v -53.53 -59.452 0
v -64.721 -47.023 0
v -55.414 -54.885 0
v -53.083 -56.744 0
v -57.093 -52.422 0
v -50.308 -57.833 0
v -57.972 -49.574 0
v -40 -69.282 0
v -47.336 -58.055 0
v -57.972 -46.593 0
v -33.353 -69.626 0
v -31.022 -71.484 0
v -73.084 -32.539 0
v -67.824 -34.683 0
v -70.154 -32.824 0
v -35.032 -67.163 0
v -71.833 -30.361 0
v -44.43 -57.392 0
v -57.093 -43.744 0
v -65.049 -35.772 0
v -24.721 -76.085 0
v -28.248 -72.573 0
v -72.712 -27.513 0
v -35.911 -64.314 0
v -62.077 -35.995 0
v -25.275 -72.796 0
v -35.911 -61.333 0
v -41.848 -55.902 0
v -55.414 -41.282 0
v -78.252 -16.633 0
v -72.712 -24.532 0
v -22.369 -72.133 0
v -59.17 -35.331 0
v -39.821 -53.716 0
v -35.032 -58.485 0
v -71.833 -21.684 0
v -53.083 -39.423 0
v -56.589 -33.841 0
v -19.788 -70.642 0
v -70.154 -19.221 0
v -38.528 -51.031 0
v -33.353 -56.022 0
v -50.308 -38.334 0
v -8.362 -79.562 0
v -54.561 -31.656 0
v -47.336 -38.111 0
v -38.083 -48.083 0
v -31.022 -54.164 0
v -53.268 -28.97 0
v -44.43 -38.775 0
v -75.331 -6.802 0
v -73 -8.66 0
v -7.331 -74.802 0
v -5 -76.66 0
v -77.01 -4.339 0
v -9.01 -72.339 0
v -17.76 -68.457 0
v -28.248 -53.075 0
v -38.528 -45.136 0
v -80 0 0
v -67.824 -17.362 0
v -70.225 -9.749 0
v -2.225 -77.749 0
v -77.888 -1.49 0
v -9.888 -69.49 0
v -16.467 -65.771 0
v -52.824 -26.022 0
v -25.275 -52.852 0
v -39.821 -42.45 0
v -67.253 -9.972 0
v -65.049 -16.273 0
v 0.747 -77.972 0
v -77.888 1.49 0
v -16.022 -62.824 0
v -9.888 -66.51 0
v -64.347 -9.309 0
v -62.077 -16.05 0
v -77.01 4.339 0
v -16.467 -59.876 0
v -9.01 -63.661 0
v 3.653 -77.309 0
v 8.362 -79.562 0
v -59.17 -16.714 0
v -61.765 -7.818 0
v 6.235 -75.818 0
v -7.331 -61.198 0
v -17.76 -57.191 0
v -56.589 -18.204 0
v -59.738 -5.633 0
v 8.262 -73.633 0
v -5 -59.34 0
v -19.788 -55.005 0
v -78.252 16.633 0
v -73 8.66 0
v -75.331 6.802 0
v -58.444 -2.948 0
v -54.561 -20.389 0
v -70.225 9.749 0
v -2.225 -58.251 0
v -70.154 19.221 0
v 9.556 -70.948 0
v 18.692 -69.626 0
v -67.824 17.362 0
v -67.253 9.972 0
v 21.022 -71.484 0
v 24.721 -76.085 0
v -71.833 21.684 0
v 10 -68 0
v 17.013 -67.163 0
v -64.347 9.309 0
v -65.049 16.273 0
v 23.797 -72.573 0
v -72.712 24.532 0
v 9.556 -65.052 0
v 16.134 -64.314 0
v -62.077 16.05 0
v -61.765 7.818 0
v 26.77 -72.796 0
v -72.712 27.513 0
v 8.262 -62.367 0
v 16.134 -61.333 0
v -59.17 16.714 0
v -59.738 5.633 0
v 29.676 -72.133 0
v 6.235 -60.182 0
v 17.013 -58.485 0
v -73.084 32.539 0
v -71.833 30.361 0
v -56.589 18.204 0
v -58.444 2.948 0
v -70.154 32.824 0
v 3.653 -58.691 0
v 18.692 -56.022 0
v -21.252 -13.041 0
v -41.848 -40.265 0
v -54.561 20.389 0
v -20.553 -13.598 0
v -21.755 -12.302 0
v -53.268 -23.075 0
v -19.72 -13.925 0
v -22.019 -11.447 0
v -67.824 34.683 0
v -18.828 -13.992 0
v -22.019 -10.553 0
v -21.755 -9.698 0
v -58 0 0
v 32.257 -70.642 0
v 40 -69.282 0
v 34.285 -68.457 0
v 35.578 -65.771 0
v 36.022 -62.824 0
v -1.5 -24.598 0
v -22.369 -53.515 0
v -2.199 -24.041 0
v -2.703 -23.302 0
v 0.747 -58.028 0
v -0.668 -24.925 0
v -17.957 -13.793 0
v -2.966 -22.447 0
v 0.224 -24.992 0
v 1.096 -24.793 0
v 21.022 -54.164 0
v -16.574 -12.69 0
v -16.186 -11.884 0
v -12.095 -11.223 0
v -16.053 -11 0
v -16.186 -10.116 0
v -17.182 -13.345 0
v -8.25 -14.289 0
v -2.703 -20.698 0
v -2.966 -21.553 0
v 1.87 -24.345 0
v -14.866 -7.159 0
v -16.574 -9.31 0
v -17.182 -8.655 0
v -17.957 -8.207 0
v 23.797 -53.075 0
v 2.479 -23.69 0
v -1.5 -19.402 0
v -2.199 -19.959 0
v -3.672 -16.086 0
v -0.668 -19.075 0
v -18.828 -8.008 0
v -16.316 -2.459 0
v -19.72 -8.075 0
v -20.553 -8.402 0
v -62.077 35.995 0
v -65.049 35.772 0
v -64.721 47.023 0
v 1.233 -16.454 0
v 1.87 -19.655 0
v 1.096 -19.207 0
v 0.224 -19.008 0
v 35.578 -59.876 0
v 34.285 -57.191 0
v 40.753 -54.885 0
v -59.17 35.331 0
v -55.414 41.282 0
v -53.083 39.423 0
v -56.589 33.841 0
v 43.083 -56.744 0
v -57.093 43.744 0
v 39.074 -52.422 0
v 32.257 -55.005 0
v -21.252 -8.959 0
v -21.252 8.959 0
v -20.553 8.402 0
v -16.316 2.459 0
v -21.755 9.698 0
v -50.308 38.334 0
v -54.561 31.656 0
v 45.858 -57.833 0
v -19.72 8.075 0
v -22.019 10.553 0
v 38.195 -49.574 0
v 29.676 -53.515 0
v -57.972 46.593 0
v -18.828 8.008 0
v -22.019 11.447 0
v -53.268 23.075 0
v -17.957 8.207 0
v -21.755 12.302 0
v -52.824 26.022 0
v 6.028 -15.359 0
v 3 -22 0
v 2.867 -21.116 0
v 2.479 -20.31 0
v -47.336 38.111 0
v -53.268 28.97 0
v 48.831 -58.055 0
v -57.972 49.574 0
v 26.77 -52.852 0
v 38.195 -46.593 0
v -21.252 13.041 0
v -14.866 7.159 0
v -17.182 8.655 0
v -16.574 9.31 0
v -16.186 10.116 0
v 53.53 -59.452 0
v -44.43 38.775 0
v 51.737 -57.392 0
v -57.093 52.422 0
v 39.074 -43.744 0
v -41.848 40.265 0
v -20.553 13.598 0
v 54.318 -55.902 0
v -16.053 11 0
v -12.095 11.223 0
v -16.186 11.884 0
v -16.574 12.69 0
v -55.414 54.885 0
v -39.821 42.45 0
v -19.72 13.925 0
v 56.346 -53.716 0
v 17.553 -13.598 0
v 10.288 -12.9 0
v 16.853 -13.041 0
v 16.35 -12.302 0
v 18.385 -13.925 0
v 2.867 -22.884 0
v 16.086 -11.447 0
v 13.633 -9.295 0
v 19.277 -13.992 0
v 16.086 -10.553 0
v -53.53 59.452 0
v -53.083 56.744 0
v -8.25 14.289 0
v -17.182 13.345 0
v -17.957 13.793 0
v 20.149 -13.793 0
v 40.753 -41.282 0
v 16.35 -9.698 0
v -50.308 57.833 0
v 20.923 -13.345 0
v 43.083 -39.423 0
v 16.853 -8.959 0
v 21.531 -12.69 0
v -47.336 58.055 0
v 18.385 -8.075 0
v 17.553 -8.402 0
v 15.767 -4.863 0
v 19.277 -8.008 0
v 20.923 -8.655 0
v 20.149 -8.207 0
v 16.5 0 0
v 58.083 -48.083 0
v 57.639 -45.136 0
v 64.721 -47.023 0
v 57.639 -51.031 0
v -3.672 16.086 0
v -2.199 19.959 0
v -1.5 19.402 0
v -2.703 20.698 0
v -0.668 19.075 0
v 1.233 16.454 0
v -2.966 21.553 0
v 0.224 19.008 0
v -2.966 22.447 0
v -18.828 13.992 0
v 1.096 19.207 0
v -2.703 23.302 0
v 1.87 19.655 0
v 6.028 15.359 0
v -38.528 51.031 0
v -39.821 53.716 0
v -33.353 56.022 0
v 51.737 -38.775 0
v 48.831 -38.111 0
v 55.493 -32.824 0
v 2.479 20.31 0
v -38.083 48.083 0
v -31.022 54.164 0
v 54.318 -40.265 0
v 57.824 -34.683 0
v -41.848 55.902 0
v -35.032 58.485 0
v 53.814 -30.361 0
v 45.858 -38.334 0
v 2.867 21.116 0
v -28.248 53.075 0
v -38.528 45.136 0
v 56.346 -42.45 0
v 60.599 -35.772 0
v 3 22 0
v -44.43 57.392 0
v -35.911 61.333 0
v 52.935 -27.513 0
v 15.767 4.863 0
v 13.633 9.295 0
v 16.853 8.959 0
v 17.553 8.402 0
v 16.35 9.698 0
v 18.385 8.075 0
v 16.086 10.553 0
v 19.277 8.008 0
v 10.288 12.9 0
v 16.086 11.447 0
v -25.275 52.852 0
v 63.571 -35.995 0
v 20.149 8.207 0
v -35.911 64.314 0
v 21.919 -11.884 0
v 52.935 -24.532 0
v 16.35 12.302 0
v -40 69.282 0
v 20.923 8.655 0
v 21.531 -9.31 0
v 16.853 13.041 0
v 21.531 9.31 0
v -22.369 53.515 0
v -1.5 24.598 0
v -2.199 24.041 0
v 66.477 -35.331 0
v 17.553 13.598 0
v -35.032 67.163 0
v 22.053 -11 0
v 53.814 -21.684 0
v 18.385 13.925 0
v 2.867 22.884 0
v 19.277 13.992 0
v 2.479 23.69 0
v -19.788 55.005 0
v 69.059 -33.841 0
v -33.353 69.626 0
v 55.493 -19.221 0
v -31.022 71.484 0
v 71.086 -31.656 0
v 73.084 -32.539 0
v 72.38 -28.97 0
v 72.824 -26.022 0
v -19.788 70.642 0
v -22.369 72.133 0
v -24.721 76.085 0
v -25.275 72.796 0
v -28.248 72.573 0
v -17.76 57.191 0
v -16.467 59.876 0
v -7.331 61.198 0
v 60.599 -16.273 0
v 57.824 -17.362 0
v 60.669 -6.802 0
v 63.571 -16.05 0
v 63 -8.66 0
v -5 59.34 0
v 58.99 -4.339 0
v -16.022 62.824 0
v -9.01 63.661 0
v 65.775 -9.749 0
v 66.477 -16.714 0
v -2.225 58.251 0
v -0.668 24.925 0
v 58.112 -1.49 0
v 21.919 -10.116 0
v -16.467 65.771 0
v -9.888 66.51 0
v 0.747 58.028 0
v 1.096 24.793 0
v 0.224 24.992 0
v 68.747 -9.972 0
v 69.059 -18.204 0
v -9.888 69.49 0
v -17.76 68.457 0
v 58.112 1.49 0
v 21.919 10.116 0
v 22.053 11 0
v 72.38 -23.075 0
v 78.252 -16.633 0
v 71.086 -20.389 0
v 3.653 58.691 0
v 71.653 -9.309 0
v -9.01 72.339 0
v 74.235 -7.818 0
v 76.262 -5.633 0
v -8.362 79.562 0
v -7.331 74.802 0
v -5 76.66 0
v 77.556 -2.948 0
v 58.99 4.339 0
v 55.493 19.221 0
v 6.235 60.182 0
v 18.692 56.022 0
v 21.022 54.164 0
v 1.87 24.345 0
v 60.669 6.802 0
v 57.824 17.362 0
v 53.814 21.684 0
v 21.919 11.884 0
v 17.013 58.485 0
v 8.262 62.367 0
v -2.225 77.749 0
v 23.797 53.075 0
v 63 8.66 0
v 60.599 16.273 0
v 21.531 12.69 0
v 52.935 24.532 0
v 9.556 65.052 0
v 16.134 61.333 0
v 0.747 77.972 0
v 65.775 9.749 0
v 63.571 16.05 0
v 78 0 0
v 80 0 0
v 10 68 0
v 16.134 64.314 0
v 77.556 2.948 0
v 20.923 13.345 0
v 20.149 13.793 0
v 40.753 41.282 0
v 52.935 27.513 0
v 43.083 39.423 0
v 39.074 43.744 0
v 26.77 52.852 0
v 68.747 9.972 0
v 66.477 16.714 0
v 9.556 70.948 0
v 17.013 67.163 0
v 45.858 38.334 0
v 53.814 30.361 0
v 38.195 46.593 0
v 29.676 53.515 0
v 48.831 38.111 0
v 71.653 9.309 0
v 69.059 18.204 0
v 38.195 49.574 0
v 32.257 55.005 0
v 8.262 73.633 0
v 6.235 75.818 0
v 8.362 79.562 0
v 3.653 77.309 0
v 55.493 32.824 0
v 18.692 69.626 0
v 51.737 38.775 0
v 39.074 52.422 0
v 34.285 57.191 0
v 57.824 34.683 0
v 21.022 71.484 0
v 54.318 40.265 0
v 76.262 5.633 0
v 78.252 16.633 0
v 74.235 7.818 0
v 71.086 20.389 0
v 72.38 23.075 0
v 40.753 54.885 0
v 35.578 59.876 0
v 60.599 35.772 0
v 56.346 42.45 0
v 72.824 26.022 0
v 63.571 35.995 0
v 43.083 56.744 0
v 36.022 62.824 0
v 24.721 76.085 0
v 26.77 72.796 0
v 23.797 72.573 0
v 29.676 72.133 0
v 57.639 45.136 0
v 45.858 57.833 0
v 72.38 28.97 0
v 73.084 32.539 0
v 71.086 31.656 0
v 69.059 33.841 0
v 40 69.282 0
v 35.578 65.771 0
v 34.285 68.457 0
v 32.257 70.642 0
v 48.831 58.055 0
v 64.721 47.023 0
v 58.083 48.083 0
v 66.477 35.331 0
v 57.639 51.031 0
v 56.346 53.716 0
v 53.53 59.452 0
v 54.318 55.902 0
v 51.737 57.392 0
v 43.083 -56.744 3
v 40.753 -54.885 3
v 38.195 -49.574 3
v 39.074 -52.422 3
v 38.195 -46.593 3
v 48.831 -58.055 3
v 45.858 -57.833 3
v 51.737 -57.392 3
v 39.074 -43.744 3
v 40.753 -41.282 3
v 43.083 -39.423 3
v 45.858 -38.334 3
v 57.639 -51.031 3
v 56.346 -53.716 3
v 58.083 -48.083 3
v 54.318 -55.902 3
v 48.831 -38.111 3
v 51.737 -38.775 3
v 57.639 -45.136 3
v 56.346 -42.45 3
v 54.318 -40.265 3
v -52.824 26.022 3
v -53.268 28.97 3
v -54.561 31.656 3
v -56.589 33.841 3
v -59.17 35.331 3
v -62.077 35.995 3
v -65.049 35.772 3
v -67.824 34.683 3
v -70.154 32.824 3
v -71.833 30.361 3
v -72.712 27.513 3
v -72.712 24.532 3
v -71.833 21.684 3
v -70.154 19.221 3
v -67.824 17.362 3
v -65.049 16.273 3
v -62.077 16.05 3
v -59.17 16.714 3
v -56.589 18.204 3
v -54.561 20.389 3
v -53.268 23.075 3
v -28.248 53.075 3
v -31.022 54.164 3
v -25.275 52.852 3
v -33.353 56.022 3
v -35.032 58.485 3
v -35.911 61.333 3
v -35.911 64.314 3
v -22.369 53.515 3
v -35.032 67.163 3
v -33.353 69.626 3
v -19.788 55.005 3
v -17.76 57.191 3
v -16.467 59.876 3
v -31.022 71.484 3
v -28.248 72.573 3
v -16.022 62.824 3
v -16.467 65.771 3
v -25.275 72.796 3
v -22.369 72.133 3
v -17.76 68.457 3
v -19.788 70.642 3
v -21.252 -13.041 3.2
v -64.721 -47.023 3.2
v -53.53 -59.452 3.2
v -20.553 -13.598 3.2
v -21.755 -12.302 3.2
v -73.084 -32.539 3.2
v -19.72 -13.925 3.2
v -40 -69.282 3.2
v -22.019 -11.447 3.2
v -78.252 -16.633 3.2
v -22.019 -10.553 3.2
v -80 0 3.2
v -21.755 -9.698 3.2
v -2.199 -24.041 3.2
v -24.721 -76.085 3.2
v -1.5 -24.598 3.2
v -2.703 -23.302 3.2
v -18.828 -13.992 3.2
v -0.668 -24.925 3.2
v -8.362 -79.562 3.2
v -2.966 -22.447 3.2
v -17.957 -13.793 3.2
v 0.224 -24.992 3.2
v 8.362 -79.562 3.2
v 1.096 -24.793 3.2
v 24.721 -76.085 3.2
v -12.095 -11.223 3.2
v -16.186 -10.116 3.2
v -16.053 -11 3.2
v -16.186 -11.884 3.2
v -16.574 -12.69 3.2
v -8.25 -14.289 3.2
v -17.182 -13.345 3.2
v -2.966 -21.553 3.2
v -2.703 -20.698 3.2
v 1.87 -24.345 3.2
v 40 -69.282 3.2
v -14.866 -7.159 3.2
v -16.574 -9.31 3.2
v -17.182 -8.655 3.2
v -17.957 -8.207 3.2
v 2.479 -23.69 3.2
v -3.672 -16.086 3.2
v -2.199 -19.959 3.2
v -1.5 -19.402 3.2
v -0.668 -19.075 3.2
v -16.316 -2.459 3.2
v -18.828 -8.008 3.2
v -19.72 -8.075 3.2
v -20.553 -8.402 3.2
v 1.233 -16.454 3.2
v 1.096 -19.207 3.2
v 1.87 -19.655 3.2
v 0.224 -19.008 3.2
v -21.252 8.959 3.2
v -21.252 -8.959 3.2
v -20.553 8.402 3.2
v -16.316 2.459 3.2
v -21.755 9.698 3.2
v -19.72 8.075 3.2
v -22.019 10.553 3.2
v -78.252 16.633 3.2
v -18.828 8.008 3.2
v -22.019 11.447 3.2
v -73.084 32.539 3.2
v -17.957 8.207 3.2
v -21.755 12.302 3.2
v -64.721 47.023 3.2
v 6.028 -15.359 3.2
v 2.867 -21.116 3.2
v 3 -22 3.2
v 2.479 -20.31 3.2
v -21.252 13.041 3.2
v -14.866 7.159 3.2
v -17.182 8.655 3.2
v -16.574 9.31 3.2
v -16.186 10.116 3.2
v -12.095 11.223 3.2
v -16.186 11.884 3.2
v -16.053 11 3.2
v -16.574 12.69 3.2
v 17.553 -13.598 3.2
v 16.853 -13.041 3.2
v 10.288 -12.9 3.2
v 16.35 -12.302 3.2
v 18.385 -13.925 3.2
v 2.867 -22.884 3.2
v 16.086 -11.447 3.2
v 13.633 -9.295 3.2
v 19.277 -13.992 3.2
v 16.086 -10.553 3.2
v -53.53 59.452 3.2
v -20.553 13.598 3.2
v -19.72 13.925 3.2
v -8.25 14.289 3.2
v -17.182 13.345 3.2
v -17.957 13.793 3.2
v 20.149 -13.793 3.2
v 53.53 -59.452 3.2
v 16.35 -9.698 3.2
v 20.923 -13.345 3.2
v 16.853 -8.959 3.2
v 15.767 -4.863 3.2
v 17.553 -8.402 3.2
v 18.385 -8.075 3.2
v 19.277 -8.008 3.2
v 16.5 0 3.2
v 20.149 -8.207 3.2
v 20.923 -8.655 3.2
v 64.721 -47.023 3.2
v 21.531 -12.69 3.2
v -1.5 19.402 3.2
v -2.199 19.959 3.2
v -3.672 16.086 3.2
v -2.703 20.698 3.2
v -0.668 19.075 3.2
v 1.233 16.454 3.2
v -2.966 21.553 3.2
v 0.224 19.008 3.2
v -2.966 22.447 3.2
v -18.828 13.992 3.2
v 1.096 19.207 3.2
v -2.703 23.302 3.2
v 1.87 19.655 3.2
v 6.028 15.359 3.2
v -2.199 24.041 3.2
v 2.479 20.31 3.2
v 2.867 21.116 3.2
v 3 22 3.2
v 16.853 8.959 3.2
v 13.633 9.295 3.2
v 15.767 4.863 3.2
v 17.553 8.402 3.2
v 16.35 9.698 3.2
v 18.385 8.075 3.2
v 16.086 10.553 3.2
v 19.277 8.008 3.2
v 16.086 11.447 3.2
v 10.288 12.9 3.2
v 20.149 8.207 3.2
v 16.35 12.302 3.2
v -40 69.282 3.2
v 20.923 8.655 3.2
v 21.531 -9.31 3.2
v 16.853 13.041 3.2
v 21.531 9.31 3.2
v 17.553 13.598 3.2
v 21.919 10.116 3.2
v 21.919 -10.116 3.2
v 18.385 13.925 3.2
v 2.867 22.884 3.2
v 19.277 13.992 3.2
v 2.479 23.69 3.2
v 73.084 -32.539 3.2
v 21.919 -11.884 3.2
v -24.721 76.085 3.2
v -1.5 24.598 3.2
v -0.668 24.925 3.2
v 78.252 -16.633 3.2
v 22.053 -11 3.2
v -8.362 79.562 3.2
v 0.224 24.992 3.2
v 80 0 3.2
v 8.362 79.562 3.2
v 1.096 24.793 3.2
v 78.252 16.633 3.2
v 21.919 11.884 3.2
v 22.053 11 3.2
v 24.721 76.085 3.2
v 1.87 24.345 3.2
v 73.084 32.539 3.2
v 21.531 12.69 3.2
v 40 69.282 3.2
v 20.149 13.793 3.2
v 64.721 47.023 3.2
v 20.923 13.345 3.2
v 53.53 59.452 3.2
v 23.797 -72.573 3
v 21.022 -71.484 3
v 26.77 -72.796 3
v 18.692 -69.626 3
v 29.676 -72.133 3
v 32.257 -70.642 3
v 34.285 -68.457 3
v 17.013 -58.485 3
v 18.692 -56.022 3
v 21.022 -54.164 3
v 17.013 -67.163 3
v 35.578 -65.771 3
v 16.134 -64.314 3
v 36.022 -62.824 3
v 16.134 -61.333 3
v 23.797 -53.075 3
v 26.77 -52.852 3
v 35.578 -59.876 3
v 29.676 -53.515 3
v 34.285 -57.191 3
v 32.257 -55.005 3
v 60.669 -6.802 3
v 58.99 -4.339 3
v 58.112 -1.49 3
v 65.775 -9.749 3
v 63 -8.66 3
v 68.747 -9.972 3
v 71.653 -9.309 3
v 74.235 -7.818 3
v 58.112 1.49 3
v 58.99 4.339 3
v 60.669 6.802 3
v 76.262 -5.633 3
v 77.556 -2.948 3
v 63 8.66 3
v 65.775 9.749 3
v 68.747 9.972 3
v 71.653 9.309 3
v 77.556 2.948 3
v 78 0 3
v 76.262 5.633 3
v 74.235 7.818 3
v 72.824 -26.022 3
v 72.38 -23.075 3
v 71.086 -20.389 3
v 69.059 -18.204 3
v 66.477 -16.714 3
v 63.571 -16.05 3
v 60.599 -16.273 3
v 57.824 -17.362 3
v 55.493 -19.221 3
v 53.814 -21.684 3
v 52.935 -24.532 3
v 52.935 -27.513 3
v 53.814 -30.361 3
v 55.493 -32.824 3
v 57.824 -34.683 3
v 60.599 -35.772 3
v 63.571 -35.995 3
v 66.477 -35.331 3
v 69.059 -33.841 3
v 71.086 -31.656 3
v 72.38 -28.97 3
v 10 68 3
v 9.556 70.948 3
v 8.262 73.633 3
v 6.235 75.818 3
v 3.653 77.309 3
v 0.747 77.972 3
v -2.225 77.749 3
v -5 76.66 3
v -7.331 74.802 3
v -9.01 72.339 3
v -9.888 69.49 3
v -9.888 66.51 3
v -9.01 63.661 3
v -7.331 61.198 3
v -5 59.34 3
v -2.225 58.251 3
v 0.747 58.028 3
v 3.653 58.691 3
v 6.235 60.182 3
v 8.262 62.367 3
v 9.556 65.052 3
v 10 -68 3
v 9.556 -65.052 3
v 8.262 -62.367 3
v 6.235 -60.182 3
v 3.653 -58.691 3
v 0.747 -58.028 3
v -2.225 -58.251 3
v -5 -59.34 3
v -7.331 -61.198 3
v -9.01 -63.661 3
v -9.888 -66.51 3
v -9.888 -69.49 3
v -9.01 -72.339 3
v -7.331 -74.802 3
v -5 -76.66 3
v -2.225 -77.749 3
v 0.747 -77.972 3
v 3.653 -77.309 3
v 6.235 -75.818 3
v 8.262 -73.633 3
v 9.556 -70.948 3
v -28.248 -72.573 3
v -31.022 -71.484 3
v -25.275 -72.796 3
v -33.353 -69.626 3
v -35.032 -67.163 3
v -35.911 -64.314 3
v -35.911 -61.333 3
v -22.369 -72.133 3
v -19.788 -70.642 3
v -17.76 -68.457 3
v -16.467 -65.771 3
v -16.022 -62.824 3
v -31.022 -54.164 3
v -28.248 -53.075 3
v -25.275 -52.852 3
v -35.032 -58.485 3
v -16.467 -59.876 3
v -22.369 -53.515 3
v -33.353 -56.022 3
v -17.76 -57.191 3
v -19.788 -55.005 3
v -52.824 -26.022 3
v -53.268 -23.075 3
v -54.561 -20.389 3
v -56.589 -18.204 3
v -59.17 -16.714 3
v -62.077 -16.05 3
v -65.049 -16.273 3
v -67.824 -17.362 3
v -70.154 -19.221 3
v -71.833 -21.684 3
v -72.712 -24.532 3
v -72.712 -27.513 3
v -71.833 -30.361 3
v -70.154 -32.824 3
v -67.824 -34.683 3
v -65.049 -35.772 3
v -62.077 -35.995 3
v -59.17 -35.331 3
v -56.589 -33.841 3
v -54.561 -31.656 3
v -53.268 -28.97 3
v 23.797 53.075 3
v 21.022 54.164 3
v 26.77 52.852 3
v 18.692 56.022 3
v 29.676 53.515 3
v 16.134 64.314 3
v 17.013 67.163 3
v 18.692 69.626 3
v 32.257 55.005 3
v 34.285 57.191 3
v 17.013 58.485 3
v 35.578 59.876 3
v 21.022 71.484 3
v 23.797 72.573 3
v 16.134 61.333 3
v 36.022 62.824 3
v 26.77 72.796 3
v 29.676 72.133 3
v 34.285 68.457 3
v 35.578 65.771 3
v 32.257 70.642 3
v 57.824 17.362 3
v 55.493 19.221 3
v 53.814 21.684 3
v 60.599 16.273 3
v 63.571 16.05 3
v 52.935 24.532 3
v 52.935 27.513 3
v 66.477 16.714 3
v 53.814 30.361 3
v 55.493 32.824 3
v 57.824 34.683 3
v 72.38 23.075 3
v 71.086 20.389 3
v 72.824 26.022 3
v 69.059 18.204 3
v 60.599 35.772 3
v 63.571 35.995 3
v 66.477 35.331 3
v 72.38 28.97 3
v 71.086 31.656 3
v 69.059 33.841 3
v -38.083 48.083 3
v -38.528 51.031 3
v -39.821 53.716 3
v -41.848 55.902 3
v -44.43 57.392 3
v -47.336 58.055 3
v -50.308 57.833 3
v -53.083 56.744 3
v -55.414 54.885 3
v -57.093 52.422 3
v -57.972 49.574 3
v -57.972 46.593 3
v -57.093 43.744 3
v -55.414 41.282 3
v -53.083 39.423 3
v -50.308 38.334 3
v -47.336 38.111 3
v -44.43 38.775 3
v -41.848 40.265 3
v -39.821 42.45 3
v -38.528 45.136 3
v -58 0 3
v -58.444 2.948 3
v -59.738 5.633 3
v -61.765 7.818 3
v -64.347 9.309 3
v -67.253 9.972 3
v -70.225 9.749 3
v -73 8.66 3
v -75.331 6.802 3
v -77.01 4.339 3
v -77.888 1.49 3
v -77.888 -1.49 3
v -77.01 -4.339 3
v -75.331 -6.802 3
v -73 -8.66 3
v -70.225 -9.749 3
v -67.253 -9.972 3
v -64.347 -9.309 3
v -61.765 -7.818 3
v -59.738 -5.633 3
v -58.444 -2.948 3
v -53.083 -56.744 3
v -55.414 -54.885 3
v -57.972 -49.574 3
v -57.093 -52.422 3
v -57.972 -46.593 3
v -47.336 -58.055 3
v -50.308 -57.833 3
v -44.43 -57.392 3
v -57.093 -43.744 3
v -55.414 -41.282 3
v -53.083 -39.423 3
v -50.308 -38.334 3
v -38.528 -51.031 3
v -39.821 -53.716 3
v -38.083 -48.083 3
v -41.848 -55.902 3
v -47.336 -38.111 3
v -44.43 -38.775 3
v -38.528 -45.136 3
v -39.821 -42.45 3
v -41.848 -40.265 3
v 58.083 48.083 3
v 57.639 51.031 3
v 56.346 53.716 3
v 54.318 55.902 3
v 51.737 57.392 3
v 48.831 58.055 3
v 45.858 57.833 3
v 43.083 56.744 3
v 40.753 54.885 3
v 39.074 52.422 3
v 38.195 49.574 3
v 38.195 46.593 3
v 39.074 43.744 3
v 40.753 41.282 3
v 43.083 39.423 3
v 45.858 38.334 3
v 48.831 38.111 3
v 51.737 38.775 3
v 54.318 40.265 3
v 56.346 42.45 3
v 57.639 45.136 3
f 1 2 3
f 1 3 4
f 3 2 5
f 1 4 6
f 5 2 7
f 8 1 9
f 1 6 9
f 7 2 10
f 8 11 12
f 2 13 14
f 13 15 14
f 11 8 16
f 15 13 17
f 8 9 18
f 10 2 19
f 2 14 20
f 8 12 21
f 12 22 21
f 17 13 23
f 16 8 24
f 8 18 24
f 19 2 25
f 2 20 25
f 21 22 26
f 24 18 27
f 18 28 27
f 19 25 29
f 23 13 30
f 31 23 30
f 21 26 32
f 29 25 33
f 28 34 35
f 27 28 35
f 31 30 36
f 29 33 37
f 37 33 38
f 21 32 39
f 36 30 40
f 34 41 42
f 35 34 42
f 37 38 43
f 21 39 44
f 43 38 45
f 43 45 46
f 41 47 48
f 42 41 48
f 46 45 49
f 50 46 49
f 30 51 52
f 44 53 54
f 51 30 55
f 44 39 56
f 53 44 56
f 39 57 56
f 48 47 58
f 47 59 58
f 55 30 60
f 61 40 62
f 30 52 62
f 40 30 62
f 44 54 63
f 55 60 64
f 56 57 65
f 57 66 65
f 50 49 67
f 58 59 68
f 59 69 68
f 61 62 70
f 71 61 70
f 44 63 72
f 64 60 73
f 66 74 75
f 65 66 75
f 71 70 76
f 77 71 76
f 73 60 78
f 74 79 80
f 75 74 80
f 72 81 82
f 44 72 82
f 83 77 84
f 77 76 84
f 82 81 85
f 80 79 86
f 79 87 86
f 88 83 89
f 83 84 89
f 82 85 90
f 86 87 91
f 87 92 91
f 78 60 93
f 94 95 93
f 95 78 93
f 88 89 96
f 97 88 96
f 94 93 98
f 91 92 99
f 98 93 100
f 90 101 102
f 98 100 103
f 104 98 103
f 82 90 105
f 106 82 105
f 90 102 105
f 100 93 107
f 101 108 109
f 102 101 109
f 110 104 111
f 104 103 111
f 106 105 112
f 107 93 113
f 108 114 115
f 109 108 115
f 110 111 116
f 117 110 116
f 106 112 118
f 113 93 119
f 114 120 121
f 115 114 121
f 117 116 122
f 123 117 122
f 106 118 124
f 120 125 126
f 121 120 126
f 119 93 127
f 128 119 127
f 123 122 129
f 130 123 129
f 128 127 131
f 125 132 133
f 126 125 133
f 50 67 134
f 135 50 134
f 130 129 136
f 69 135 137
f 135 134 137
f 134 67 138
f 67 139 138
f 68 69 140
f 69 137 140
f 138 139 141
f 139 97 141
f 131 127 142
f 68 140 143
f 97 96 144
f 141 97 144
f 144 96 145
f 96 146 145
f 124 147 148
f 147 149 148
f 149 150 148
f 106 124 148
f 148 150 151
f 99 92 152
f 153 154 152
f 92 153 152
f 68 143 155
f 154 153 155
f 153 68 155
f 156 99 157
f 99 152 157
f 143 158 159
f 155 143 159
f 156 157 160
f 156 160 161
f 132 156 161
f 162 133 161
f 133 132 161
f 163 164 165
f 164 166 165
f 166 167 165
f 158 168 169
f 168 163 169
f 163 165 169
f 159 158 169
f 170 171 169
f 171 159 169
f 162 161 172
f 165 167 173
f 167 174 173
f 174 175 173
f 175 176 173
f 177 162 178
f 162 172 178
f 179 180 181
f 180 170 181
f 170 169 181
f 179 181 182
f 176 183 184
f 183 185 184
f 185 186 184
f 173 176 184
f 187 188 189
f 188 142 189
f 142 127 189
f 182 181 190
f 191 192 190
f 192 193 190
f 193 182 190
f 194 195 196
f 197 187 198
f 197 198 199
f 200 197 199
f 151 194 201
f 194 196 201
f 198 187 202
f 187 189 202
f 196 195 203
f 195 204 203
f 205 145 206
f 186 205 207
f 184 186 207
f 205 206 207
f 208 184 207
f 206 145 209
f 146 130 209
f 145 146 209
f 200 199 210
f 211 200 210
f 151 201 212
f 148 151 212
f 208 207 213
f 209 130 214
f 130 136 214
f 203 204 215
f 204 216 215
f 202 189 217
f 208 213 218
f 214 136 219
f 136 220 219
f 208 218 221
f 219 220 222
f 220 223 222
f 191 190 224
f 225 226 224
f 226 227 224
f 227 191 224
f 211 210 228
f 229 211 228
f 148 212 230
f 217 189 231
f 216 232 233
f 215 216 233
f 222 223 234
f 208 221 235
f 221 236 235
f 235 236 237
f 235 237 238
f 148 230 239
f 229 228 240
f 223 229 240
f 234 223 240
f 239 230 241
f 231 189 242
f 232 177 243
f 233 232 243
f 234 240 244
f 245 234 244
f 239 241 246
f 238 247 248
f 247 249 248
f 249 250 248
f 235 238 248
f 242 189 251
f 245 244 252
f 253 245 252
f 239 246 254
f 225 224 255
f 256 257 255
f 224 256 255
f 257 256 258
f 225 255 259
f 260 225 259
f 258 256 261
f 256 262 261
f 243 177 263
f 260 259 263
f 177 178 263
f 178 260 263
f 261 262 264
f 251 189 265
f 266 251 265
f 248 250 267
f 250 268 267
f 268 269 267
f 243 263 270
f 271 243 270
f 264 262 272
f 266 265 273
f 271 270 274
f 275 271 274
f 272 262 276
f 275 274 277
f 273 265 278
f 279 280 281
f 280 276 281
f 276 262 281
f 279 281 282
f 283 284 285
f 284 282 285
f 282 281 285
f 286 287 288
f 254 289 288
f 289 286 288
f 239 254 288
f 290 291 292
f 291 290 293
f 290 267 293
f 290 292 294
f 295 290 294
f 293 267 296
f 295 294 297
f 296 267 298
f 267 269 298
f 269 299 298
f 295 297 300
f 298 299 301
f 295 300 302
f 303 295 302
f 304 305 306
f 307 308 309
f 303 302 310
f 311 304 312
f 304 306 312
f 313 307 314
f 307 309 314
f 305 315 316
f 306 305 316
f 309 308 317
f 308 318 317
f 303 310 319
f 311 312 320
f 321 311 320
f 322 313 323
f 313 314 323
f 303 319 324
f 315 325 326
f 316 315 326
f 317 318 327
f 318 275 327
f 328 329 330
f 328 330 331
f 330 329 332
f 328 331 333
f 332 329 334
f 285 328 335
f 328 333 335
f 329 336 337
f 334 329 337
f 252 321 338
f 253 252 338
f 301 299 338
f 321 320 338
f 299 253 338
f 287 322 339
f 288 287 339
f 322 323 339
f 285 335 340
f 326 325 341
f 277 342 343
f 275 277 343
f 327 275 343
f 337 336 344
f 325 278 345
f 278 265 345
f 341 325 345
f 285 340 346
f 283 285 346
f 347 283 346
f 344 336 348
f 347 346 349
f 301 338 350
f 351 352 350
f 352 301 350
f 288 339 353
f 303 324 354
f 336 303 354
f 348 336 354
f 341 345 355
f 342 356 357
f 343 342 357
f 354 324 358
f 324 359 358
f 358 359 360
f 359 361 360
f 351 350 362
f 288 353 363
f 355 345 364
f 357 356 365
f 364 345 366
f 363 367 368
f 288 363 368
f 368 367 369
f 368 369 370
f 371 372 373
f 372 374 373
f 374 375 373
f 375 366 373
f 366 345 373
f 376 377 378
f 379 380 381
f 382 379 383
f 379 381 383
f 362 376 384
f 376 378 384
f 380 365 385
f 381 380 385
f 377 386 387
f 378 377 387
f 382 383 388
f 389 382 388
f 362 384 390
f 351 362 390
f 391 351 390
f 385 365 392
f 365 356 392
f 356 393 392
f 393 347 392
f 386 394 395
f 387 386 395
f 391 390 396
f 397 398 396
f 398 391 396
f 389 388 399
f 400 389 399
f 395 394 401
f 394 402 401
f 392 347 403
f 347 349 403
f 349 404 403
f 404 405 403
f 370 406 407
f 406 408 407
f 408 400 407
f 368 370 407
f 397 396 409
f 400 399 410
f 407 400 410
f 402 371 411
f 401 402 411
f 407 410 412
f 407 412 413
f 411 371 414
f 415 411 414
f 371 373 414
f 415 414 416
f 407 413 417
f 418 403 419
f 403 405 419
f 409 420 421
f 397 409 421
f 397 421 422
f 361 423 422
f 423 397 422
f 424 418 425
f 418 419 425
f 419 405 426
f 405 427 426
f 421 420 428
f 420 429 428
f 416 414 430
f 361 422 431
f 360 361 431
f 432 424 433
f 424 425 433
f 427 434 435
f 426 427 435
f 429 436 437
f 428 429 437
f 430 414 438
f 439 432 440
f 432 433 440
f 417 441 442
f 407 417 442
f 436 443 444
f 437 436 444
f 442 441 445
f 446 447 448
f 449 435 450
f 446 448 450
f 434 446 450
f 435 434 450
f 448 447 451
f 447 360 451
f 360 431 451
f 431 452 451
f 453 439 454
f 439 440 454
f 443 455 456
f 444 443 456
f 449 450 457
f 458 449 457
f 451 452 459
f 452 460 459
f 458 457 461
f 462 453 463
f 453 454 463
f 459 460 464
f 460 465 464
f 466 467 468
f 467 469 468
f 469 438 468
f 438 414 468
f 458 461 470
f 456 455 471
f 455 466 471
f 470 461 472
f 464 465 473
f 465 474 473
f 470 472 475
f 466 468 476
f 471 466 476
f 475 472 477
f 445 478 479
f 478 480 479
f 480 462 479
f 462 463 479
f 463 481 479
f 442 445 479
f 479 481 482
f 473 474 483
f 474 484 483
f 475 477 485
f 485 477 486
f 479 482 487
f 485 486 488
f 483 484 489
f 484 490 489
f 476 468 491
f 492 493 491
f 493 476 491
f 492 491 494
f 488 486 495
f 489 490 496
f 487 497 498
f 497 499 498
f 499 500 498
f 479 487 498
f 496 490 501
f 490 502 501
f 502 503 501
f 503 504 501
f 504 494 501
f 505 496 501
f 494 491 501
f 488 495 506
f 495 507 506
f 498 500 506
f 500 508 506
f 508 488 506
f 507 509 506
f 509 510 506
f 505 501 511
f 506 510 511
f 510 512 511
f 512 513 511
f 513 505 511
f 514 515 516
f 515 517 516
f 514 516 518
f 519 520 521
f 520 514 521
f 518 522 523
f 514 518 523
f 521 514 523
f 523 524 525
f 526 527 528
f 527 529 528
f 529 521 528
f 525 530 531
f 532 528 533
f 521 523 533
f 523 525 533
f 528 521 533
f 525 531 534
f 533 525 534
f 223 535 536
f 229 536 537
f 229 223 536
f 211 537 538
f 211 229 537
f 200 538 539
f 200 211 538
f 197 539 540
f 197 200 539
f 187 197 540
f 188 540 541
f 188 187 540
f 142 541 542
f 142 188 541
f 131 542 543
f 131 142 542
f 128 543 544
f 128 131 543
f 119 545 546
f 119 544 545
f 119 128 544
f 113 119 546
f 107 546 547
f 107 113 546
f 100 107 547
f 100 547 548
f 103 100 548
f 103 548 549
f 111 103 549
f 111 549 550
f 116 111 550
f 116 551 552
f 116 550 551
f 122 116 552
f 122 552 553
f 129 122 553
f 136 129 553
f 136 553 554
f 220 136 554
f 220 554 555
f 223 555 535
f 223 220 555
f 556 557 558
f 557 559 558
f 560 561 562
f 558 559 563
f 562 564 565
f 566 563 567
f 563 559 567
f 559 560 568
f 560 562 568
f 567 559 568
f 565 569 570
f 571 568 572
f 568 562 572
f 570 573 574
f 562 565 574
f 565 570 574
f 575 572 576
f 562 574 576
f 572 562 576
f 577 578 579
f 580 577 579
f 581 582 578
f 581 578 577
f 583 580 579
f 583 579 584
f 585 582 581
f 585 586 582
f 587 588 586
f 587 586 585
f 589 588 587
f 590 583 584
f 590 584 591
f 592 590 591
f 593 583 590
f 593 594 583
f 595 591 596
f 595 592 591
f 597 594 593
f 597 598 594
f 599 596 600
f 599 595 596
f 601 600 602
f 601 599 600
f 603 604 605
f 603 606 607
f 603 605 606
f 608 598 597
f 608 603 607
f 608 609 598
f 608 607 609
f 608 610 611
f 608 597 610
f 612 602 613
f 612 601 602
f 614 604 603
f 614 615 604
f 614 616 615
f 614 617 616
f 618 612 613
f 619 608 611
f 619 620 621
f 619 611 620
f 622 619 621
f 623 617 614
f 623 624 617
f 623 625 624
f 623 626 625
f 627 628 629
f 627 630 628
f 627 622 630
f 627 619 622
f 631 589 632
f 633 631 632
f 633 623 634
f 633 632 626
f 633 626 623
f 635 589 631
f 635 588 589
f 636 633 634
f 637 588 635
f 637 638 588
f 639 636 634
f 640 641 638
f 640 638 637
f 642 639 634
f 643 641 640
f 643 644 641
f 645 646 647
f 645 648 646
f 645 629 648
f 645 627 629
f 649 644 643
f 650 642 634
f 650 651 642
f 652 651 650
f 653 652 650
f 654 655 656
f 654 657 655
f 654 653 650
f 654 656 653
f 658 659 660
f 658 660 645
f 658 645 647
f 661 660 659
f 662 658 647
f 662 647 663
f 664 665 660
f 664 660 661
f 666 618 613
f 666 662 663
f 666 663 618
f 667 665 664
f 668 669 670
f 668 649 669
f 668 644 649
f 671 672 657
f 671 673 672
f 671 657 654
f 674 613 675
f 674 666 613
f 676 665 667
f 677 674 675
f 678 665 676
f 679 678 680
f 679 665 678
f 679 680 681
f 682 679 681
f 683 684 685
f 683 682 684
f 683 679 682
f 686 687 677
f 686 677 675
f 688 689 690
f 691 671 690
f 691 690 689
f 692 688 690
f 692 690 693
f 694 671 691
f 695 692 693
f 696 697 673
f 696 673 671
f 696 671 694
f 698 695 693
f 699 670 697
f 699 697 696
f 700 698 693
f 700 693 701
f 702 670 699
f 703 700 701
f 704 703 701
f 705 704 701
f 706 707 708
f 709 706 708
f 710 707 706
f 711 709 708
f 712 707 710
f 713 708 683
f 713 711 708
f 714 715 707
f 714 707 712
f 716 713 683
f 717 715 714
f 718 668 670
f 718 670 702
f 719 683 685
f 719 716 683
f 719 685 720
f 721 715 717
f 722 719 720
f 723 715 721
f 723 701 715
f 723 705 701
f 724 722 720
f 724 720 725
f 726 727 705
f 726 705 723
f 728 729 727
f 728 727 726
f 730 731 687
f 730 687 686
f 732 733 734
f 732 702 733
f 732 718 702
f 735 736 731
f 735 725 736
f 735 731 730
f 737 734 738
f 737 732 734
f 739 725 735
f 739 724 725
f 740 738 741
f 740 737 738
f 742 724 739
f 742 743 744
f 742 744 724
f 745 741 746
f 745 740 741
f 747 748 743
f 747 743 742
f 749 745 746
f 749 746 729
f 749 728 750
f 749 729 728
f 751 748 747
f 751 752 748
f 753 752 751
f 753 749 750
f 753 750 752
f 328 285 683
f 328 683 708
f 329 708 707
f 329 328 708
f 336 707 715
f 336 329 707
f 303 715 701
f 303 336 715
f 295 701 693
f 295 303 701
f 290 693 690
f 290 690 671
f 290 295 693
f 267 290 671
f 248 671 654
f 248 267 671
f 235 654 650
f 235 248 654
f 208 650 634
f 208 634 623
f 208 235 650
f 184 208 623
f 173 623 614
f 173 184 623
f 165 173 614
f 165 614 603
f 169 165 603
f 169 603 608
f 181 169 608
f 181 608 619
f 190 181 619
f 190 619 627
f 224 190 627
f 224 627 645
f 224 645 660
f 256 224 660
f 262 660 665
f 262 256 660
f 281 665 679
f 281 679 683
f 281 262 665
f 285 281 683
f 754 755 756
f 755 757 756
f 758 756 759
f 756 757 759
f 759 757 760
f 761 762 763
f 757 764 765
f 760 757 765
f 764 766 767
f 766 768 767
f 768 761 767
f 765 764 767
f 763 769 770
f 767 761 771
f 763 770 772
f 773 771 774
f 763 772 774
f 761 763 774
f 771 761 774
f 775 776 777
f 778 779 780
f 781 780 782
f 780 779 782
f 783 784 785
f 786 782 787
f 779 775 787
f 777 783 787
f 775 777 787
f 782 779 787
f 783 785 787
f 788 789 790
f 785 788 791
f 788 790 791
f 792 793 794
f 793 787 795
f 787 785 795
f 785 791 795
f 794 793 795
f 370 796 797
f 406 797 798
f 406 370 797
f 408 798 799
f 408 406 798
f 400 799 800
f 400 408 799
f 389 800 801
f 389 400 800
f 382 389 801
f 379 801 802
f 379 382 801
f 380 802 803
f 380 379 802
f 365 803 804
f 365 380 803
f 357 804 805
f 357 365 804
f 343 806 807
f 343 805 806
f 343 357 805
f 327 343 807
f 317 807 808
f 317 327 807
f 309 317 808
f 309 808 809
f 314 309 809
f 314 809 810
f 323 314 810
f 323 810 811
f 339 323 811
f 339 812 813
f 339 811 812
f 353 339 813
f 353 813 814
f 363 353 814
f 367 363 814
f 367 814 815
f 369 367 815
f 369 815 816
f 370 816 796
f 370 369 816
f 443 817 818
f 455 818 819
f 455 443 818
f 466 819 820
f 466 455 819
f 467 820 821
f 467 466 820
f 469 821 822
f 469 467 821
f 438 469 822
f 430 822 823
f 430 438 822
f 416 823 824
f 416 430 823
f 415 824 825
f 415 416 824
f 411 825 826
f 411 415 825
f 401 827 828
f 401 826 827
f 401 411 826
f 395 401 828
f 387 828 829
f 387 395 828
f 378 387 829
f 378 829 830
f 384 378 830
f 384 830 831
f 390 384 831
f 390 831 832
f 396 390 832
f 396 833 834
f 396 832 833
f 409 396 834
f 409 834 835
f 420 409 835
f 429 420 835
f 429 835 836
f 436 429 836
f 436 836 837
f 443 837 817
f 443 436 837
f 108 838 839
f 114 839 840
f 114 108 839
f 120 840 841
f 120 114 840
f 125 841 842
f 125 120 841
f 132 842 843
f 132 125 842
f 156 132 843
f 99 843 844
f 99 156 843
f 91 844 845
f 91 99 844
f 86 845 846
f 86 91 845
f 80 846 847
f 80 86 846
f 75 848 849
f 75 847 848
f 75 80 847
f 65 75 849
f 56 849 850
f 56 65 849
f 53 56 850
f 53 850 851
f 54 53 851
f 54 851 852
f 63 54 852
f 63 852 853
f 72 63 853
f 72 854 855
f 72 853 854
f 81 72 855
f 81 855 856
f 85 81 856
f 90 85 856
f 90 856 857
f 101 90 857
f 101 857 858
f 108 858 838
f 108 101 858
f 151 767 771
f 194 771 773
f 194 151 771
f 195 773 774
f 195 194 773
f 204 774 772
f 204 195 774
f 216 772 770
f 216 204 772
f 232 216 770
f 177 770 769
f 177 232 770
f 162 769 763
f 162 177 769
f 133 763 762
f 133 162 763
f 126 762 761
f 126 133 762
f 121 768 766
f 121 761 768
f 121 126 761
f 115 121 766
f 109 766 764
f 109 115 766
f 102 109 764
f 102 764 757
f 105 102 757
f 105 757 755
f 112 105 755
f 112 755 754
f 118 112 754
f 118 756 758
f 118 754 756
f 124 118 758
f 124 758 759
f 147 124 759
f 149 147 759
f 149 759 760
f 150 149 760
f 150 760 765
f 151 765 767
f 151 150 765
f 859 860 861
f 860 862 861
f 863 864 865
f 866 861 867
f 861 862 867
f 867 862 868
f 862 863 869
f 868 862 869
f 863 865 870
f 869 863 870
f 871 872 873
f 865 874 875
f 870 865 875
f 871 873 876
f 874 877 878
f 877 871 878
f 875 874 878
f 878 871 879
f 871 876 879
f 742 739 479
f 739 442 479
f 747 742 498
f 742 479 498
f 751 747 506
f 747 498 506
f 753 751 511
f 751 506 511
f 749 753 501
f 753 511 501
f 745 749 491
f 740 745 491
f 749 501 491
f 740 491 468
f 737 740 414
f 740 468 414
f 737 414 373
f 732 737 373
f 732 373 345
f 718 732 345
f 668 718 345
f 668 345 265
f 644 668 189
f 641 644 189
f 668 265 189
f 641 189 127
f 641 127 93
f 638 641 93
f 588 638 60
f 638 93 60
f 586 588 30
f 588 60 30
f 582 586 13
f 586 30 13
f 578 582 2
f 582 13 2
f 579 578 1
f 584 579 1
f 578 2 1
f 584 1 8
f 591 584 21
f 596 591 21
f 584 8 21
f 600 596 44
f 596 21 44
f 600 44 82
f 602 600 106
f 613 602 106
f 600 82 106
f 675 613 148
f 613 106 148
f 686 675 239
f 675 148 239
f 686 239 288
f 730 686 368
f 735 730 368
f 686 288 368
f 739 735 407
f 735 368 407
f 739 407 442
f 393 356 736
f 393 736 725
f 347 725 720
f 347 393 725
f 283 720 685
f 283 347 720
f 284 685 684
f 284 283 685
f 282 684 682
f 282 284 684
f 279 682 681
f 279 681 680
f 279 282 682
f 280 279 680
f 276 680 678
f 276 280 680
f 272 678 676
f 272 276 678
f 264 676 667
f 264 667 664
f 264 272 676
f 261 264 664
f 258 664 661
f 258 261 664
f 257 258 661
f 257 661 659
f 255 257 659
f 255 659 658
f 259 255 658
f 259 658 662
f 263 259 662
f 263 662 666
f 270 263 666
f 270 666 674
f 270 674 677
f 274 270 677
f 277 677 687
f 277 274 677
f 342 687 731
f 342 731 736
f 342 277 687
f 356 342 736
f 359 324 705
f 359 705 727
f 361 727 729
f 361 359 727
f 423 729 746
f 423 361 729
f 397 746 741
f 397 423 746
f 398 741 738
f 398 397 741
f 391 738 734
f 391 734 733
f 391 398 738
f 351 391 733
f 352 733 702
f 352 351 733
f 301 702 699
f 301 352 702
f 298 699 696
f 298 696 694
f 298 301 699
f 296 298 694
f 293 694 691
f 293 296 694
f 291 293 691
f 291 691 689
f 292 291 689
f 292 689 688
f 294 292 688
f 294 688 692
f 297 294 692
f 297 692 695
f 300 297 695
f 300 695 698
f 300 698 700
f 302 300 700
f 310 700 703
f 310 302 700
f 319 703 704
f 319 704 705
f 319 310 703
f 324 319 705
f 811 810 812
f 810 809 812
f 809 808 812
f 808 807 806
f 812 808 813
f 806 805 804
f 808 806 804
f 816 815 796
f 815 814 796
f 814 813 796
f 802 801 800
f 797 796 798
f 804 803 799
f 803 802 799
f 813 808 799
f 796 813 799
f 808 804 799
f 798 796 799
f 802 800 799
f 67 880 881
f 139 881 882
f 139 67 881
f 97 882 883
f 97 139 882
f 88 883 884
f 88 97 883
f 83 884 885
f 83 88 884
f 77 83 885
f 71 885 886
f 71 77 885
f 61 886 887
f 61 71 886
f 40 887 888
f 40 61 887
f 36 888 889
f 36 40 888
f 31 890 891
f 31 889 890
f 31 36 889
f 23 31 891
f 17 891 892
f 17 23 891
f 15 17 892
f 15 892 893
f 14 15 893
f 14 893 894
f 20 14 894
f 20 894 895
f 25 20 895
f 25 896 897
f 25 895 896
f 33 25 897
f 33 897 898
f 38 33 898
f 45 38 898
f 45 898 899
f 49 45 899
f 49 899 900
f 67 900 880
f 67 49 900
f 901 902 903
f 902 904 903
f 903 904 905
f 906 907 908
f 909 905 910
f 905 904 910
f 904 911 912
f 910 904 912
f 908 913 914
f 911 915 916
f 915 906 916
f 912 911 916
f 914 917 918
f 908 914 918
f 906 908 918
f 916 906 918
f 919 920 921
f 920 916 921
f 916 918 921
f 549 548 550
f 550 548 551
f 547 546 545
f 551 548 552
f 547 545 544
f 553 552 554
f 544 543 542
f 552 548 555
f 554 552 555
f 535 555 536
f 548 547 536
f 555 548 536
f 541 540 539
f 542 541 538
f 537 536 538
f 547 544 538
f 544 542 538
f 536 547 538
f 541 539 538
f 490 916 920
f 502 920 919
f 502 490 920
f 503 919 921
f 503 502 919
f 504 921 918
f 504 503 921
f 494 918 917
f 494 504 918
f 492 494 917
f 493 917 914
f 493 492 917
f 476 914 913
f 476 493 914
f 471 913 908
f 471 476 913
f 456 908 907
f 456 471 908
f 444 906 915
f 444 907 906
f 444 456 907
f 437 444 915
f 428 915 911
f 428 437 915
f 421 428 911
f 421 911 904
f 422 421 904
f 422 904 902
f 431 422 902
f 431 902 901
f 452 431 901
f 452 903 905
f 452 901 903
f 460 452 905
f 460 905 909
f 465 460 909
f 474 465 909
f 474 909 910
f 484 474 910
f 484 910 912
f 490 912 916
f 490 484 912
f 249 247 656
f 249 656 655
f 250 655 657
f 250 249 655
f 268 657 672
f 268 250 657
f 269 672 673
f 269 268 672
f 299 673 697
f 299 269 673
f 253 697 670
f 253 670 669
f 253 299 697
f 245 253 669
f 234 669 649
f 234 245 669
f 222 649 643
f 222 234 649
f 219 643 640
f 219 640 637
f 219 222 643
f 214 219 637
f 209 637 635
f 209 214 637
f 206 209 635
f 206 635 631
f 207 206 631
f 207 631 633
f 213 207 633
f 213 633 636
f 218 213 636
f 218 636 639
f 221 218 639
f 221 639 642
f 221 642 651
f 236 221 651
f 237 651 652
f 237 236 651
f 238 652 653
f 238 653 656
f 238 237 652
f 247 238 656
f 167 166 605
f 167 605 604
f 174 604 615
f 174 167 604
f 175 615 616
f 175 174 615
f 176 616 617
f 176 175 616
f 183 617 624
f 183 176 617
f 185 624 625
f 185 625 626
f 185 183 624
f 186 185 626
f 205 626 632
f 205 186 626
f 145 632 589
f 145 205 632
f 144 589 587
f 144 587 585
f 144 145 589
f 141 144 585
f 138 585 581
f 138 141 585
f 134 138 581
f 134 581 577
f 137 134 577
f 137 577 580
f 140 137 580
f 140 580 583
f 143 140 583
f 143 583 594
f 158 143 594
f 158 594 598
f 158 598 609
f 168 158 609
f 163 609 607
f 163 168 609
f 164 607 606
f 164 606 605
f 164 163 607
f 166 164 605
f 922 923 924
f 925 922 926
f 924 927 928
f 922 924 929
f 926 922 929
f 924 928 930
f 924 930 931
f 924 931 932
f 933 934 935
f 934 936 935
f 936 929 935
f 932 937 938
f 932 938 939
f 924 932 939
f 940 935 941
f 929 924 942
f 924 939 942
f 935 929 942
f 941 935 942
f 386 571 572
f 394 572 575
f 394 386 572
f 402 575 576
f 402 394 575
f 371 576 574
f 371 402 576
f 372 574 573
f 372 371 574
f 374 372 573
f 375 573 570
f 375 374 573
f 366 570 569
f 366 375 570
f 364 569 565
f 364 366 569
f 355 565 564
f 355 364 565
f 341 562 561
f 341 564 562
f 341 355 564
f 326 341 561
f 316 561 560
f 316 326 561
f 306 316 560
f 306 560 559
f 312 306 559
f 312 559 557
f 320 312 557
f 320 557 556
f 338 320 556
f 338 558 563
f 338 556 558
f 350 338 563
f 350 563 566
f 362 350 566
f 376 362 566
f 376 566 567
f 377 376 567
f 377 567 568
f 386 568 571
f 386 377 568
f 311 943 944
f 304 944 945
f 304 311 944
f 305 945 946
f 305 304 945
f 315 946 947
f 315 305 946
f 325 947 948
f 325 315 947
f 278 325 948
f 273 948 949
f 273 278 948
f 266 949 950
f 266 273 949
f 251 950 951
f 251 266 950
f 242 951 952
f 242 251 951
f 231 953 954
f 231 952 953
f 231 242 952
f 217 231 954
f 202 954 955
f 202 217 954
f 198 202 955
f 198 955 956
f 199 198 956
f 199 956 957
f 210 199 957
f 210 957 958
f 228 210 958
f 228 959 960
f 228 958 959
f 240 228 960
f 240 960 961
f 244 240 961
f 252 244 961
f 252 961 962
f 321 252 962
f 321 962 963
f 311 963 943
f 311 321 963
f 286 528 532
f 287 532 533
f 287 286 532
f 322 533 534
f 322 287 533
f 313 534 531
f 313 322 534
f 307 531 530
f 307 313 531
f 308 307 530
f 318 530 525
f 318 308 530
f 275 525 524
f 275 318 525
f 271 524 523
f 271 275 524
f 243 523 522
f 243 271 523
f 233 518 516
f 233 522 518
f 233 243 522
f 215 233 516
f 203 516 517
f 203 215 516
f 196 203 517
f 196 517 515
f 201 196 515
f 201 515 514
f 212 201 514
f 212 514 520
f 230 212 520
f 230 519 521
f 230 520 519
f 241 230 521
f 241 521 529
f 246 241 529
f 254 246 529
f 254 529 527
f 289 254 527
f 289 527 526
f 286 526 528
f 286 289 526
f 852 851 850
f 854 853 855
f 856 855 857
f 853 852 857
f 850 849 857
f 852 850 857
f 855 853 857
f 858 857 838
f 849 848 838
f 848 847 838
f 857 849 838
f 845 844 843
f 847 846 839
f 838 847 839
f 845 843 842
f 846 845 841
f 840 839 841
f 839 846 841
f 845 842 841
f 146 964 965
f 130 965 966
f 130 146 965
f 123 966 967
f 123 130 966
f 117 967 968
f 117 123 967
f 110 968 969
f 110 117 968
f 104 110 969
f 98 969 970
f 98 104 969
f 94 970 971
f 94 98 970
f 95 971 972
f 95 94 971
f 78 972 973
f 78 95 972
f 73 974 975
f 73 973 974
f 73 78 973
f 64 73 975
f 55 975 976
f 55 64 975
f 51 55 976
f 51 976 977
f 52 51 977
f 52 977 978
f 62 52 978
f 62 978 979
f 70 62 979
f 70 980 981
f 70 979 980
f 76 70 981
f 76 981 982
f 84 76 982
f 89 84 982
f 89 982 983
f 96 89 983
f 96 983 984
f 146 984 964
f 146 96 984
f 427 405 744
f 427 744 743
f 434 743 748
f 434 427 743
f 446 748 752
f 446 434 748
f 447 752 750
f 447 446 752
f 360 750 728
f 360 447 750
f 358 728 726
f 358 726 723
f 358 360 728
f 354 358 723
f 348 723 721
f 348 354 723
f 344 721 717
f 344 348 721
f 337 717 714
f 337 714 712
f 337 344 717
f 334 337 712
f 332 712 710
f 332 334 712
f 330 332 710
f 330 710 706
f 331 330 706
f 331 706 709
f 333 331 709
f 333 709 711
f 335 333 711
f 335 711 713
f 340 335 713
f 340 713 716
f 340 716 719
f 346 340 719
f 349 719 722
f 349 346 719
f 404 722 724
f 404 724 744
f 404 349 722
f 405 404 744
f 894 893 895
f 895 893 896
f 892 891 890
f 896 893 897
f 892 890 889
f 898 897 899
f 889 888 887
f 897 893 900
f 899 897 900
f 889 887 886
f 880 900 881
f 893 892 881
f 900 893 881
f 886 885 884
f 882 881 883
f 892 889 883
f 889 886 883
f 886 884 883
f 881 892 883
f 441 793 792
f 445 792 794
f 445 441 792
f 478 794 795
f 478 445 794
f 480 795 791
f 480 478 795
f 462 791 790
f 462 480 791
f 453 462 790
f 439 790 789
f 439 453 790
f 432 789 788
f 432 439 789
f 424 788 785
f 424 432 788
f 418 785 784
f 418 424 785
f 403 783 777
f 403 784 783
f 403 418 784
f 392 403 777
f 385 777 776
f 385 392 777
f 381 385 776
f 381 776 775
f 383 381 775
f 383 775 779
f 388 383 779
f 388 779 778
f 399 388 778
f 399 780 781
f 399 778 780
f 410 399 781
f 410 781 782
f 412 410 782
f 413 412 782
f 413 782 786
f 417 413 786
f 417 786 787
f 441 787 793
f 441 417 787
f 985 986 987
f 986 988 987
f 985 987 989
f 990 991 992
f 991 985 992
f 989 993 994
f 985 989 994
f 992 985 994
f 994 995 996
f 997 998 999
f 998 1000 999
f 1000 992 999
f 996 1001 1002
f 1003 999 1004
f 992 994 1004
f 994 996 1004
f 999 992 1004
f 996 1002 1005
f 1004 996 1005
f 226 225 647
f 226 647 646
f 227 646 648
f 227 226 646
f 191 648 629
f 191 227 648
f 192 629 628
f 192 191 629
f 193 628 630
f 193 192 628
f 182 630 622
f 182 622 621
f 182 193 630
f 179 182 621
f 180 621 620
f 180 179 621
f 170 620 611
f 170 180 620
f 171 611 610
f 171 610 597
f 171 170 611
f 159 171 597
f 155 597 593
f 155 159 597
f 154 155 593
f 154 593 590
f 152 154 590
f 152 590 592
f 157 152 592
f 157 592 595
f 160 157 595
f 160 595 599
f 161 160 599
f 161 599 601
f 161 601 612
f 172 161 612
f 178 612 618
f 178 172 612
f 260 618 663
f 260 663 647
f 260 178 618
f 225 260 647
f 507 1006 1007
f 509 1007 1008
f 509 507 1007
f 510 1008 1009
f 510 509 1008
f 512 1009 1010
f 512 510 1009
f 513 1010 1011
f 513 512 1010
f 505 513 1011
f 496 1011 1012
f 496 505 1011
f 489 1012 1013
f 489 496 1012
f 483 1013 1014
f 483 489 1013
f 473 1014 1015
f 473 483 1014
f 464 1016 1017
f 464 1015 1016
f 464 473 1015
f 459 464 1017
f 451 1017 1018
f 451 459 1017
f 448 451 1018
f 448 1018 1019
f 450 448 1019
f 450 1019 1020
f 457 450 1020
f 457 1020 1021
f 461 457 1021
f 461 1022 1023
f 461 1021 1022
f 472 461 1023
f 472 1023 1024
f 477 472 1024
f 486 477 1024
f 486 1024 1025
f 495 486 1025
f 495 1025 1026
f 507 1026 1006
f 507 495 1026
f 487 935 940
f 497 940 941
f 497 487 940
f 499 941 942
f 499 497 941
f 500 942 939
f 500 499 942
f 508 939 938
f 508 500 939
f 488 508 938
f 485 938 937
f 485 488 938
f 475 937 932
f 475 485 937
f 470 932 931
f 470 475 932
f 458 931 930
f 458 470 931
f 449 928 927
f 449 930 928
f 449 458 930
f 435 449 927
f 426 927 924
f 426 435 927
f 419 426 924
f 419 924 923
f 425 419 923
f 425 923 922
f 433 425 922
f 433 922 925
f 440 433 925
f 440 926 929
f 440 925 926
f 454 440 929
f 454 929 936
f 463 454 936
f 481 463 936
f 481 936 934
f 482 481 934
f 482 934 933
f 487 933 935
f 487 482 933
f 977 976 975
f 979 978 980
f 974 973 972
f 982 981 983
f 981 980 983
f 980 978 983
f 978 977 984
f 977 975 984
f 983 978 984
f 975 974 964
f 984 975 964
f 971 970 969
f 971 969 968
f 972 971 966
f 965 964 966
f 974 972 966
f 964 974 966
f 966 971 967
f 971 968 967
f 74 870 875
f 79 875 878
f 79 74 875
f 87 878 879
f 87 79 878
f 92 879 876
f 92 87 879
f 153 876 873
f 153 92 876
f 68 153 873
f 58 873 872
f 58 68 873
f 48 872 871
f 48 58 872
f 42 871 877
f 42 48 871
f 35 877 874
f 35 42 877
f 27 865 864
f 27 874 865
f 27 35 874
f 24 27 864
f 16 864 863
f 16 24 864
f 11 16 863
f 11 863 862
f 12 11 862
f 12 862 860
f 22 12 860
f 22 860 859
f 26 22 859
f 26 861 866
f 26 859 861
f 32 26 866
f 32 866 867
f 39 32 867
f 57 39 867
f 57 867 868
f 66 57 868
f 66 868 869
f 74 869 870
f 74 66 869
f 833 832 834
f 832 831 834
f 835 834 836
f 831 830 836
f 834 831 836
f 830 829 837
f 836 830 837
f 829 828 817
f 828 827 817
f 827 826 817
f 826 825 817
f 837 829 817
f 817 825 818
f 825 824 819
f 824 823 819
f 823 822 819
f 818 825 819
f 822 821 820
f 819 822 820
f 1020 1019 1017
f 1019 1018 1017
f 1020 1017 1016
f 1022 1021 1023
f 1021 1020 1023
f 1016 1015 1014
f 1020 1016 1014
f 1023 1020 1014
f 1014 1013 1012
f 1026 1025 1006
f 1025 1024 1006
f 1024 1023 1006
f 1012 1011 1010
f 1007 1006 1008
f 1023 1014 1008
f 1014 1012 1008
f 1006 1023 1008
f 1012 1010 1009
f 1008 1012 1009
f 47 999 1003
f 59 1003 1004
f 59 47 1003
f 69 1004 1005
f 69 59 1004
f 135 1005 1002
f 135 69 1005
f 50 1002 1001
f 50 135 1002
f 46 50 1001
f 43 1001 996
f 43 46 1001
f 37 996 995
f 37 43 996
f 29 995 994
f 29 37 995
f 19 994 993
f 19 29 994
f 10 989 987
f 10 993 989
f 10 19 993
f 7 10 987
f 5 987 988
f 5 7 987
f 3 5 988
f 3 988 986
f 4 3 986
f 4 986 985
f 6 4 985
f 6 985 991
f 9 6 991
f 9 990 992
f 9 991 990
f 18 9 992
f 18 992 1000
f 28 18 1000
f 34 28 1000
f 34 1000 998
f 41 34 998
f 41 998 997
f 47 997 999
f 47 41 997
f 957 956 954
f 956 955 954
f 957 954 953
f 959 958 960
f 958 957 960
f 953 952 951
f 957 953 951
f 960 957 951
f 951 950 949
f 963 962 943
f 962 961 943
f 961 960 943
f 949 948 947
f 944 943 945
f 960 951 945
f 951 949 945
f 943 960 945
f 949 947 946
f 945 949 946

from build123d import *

# Parameters (mm, degrees)
ESQUISSE1_R        = 80
ESQUISSE1_R_2      = 3
ESQUISSE1_R_3      = 16.5
ESQUISSE1_R_4      = 10
BOSS_EXTRU_1_DEPTH = 3.2
BOSS_EXTRU_2_START = -0.2
ESQUISSE2_R        = 80
ESQUISSE2_R_2      = 53.253598624
BOSS_EXTRU_2_DEPTH = 0.2


with BuildPart() as part:
    # Esquisse1 → Boss.-Extru.1 (new body)
    with BuildSketch(Plane.XY):
        Circle(ESQUISSE1_R)
        with Locations((0, 22)):
            Circle(ESQUISSE1_R_2, mode=Mode.SUBTRACT)
        Circle(ESQUISSE1_R_3, mode=Mode.SUBTRACT)
        with Locations((19.052558883, 11)):
            Circle(ESQUISSE1_R_2, mode=Mode.SUBTRACT)
        with Locations((19.052558883, -11)):
            Circle(ESQUISSE1_R_2, mode=Mode.SUBTRACT)
        with Locations((0, -22)):
            Circle(ESQUISSE1_R_2, mode=Mode.SUBTRACT)
        with Locations((-19.052558883, -11)):
            Circle(ESQUISSE1_R_2, mode=Mode.SUBTRACT)
        with Locations((-19.052558883, 11)):
            Circle(ESQUISSE1_R_2, mode=Mode.SUBTRACT)
        with Locations((0, 68)):
            Circle(ESQUISSE1_R_4, mode=Mode.SUBTRACT)
        with Locations((26.022473401, 62.823808211)):
            Circle(ESQUISSE1_R_4, mode=Mode.SUBTRACT)
        with Locations((48.083261121, 48.083261121)):
            Circle(ESQUISSE1_R_4, mode=Mode.SUBTRACT)
        with Locations((62.823808211, 26.022473401)):
            Circle(ESQUISSE1_R_4, mode=Mode.SUBTRACT)
        with Locations((68, 0)):
            Circle(ESQUISSE1_R_4, mode=Mode.SUBTRACT)
        with Locations((62.823808211, -26.022473401)):
            Circle(ESQUISSE1_R_4, mode=Mode.SUBTRACT)
        with Locations((48.083261121, -48.083261121)):
            Circle(ESQUISSE1_R_4, mode=Mode.SUBTRACT)
        with Locations((26.022473401, -62.823808211)):
            Circle(ESQUISSE1_R_4, mode=Mode.SUBTRACT)
        with Locations((0, -68)):
            Circle(ESQUISSE1_R_4, mode=Mode.SUBTRACT)
        with Locations((-26.022473401, -62.823808211)):
            Circle(ESQUISSE1_R_4, mode=Mode.SUBTRACT)
        with Locations((-48.083261121, -48.083261121)):
            Circle(ESQUISSE1_R_4, mode=Mode.SUBTRACT)
        with Locations((-62.823808211, -26.022473401)):
            Circle(ESQUISSE1_R_4, mode=Mode.SUBTRACT)
        with Locations((-68, 0)):
            Circle(ESQUISSE1_R_4, mode=Mode.SUBTRACT)
        with Locations((-62.823808211, 26.022473401)):
            Circle(ESQUISSE1_R_4, mode=Mode.SUBTRACT)
        with Locations((-48.083261121, 48.083261121)):
            Circle(ESQUISSE1_R_4, mode=Mode.SUBTRACT)
        with Locations((-26.022473401, 62.823808211)):
            Circle(ESQUISSE1_R_4, mode=Mode.SUBTRACT)
    extrude(amount=BOSS_EXTRU_1_DEPTH)

    # Esquisse2 → Boss.-Extru.2 (add)
    with BuildSketch(Plane.XY.offset(3.2).offset(BOSS_EXTRU_2_START)):
        Circle(ESQUISSE2_R)
        Circle(ESQUISSE2_R_2, mode=Mode.SUBTRACT)
    extrude(amount=BOSS_EXTRU_2_DEPTH)


solid = part.part
